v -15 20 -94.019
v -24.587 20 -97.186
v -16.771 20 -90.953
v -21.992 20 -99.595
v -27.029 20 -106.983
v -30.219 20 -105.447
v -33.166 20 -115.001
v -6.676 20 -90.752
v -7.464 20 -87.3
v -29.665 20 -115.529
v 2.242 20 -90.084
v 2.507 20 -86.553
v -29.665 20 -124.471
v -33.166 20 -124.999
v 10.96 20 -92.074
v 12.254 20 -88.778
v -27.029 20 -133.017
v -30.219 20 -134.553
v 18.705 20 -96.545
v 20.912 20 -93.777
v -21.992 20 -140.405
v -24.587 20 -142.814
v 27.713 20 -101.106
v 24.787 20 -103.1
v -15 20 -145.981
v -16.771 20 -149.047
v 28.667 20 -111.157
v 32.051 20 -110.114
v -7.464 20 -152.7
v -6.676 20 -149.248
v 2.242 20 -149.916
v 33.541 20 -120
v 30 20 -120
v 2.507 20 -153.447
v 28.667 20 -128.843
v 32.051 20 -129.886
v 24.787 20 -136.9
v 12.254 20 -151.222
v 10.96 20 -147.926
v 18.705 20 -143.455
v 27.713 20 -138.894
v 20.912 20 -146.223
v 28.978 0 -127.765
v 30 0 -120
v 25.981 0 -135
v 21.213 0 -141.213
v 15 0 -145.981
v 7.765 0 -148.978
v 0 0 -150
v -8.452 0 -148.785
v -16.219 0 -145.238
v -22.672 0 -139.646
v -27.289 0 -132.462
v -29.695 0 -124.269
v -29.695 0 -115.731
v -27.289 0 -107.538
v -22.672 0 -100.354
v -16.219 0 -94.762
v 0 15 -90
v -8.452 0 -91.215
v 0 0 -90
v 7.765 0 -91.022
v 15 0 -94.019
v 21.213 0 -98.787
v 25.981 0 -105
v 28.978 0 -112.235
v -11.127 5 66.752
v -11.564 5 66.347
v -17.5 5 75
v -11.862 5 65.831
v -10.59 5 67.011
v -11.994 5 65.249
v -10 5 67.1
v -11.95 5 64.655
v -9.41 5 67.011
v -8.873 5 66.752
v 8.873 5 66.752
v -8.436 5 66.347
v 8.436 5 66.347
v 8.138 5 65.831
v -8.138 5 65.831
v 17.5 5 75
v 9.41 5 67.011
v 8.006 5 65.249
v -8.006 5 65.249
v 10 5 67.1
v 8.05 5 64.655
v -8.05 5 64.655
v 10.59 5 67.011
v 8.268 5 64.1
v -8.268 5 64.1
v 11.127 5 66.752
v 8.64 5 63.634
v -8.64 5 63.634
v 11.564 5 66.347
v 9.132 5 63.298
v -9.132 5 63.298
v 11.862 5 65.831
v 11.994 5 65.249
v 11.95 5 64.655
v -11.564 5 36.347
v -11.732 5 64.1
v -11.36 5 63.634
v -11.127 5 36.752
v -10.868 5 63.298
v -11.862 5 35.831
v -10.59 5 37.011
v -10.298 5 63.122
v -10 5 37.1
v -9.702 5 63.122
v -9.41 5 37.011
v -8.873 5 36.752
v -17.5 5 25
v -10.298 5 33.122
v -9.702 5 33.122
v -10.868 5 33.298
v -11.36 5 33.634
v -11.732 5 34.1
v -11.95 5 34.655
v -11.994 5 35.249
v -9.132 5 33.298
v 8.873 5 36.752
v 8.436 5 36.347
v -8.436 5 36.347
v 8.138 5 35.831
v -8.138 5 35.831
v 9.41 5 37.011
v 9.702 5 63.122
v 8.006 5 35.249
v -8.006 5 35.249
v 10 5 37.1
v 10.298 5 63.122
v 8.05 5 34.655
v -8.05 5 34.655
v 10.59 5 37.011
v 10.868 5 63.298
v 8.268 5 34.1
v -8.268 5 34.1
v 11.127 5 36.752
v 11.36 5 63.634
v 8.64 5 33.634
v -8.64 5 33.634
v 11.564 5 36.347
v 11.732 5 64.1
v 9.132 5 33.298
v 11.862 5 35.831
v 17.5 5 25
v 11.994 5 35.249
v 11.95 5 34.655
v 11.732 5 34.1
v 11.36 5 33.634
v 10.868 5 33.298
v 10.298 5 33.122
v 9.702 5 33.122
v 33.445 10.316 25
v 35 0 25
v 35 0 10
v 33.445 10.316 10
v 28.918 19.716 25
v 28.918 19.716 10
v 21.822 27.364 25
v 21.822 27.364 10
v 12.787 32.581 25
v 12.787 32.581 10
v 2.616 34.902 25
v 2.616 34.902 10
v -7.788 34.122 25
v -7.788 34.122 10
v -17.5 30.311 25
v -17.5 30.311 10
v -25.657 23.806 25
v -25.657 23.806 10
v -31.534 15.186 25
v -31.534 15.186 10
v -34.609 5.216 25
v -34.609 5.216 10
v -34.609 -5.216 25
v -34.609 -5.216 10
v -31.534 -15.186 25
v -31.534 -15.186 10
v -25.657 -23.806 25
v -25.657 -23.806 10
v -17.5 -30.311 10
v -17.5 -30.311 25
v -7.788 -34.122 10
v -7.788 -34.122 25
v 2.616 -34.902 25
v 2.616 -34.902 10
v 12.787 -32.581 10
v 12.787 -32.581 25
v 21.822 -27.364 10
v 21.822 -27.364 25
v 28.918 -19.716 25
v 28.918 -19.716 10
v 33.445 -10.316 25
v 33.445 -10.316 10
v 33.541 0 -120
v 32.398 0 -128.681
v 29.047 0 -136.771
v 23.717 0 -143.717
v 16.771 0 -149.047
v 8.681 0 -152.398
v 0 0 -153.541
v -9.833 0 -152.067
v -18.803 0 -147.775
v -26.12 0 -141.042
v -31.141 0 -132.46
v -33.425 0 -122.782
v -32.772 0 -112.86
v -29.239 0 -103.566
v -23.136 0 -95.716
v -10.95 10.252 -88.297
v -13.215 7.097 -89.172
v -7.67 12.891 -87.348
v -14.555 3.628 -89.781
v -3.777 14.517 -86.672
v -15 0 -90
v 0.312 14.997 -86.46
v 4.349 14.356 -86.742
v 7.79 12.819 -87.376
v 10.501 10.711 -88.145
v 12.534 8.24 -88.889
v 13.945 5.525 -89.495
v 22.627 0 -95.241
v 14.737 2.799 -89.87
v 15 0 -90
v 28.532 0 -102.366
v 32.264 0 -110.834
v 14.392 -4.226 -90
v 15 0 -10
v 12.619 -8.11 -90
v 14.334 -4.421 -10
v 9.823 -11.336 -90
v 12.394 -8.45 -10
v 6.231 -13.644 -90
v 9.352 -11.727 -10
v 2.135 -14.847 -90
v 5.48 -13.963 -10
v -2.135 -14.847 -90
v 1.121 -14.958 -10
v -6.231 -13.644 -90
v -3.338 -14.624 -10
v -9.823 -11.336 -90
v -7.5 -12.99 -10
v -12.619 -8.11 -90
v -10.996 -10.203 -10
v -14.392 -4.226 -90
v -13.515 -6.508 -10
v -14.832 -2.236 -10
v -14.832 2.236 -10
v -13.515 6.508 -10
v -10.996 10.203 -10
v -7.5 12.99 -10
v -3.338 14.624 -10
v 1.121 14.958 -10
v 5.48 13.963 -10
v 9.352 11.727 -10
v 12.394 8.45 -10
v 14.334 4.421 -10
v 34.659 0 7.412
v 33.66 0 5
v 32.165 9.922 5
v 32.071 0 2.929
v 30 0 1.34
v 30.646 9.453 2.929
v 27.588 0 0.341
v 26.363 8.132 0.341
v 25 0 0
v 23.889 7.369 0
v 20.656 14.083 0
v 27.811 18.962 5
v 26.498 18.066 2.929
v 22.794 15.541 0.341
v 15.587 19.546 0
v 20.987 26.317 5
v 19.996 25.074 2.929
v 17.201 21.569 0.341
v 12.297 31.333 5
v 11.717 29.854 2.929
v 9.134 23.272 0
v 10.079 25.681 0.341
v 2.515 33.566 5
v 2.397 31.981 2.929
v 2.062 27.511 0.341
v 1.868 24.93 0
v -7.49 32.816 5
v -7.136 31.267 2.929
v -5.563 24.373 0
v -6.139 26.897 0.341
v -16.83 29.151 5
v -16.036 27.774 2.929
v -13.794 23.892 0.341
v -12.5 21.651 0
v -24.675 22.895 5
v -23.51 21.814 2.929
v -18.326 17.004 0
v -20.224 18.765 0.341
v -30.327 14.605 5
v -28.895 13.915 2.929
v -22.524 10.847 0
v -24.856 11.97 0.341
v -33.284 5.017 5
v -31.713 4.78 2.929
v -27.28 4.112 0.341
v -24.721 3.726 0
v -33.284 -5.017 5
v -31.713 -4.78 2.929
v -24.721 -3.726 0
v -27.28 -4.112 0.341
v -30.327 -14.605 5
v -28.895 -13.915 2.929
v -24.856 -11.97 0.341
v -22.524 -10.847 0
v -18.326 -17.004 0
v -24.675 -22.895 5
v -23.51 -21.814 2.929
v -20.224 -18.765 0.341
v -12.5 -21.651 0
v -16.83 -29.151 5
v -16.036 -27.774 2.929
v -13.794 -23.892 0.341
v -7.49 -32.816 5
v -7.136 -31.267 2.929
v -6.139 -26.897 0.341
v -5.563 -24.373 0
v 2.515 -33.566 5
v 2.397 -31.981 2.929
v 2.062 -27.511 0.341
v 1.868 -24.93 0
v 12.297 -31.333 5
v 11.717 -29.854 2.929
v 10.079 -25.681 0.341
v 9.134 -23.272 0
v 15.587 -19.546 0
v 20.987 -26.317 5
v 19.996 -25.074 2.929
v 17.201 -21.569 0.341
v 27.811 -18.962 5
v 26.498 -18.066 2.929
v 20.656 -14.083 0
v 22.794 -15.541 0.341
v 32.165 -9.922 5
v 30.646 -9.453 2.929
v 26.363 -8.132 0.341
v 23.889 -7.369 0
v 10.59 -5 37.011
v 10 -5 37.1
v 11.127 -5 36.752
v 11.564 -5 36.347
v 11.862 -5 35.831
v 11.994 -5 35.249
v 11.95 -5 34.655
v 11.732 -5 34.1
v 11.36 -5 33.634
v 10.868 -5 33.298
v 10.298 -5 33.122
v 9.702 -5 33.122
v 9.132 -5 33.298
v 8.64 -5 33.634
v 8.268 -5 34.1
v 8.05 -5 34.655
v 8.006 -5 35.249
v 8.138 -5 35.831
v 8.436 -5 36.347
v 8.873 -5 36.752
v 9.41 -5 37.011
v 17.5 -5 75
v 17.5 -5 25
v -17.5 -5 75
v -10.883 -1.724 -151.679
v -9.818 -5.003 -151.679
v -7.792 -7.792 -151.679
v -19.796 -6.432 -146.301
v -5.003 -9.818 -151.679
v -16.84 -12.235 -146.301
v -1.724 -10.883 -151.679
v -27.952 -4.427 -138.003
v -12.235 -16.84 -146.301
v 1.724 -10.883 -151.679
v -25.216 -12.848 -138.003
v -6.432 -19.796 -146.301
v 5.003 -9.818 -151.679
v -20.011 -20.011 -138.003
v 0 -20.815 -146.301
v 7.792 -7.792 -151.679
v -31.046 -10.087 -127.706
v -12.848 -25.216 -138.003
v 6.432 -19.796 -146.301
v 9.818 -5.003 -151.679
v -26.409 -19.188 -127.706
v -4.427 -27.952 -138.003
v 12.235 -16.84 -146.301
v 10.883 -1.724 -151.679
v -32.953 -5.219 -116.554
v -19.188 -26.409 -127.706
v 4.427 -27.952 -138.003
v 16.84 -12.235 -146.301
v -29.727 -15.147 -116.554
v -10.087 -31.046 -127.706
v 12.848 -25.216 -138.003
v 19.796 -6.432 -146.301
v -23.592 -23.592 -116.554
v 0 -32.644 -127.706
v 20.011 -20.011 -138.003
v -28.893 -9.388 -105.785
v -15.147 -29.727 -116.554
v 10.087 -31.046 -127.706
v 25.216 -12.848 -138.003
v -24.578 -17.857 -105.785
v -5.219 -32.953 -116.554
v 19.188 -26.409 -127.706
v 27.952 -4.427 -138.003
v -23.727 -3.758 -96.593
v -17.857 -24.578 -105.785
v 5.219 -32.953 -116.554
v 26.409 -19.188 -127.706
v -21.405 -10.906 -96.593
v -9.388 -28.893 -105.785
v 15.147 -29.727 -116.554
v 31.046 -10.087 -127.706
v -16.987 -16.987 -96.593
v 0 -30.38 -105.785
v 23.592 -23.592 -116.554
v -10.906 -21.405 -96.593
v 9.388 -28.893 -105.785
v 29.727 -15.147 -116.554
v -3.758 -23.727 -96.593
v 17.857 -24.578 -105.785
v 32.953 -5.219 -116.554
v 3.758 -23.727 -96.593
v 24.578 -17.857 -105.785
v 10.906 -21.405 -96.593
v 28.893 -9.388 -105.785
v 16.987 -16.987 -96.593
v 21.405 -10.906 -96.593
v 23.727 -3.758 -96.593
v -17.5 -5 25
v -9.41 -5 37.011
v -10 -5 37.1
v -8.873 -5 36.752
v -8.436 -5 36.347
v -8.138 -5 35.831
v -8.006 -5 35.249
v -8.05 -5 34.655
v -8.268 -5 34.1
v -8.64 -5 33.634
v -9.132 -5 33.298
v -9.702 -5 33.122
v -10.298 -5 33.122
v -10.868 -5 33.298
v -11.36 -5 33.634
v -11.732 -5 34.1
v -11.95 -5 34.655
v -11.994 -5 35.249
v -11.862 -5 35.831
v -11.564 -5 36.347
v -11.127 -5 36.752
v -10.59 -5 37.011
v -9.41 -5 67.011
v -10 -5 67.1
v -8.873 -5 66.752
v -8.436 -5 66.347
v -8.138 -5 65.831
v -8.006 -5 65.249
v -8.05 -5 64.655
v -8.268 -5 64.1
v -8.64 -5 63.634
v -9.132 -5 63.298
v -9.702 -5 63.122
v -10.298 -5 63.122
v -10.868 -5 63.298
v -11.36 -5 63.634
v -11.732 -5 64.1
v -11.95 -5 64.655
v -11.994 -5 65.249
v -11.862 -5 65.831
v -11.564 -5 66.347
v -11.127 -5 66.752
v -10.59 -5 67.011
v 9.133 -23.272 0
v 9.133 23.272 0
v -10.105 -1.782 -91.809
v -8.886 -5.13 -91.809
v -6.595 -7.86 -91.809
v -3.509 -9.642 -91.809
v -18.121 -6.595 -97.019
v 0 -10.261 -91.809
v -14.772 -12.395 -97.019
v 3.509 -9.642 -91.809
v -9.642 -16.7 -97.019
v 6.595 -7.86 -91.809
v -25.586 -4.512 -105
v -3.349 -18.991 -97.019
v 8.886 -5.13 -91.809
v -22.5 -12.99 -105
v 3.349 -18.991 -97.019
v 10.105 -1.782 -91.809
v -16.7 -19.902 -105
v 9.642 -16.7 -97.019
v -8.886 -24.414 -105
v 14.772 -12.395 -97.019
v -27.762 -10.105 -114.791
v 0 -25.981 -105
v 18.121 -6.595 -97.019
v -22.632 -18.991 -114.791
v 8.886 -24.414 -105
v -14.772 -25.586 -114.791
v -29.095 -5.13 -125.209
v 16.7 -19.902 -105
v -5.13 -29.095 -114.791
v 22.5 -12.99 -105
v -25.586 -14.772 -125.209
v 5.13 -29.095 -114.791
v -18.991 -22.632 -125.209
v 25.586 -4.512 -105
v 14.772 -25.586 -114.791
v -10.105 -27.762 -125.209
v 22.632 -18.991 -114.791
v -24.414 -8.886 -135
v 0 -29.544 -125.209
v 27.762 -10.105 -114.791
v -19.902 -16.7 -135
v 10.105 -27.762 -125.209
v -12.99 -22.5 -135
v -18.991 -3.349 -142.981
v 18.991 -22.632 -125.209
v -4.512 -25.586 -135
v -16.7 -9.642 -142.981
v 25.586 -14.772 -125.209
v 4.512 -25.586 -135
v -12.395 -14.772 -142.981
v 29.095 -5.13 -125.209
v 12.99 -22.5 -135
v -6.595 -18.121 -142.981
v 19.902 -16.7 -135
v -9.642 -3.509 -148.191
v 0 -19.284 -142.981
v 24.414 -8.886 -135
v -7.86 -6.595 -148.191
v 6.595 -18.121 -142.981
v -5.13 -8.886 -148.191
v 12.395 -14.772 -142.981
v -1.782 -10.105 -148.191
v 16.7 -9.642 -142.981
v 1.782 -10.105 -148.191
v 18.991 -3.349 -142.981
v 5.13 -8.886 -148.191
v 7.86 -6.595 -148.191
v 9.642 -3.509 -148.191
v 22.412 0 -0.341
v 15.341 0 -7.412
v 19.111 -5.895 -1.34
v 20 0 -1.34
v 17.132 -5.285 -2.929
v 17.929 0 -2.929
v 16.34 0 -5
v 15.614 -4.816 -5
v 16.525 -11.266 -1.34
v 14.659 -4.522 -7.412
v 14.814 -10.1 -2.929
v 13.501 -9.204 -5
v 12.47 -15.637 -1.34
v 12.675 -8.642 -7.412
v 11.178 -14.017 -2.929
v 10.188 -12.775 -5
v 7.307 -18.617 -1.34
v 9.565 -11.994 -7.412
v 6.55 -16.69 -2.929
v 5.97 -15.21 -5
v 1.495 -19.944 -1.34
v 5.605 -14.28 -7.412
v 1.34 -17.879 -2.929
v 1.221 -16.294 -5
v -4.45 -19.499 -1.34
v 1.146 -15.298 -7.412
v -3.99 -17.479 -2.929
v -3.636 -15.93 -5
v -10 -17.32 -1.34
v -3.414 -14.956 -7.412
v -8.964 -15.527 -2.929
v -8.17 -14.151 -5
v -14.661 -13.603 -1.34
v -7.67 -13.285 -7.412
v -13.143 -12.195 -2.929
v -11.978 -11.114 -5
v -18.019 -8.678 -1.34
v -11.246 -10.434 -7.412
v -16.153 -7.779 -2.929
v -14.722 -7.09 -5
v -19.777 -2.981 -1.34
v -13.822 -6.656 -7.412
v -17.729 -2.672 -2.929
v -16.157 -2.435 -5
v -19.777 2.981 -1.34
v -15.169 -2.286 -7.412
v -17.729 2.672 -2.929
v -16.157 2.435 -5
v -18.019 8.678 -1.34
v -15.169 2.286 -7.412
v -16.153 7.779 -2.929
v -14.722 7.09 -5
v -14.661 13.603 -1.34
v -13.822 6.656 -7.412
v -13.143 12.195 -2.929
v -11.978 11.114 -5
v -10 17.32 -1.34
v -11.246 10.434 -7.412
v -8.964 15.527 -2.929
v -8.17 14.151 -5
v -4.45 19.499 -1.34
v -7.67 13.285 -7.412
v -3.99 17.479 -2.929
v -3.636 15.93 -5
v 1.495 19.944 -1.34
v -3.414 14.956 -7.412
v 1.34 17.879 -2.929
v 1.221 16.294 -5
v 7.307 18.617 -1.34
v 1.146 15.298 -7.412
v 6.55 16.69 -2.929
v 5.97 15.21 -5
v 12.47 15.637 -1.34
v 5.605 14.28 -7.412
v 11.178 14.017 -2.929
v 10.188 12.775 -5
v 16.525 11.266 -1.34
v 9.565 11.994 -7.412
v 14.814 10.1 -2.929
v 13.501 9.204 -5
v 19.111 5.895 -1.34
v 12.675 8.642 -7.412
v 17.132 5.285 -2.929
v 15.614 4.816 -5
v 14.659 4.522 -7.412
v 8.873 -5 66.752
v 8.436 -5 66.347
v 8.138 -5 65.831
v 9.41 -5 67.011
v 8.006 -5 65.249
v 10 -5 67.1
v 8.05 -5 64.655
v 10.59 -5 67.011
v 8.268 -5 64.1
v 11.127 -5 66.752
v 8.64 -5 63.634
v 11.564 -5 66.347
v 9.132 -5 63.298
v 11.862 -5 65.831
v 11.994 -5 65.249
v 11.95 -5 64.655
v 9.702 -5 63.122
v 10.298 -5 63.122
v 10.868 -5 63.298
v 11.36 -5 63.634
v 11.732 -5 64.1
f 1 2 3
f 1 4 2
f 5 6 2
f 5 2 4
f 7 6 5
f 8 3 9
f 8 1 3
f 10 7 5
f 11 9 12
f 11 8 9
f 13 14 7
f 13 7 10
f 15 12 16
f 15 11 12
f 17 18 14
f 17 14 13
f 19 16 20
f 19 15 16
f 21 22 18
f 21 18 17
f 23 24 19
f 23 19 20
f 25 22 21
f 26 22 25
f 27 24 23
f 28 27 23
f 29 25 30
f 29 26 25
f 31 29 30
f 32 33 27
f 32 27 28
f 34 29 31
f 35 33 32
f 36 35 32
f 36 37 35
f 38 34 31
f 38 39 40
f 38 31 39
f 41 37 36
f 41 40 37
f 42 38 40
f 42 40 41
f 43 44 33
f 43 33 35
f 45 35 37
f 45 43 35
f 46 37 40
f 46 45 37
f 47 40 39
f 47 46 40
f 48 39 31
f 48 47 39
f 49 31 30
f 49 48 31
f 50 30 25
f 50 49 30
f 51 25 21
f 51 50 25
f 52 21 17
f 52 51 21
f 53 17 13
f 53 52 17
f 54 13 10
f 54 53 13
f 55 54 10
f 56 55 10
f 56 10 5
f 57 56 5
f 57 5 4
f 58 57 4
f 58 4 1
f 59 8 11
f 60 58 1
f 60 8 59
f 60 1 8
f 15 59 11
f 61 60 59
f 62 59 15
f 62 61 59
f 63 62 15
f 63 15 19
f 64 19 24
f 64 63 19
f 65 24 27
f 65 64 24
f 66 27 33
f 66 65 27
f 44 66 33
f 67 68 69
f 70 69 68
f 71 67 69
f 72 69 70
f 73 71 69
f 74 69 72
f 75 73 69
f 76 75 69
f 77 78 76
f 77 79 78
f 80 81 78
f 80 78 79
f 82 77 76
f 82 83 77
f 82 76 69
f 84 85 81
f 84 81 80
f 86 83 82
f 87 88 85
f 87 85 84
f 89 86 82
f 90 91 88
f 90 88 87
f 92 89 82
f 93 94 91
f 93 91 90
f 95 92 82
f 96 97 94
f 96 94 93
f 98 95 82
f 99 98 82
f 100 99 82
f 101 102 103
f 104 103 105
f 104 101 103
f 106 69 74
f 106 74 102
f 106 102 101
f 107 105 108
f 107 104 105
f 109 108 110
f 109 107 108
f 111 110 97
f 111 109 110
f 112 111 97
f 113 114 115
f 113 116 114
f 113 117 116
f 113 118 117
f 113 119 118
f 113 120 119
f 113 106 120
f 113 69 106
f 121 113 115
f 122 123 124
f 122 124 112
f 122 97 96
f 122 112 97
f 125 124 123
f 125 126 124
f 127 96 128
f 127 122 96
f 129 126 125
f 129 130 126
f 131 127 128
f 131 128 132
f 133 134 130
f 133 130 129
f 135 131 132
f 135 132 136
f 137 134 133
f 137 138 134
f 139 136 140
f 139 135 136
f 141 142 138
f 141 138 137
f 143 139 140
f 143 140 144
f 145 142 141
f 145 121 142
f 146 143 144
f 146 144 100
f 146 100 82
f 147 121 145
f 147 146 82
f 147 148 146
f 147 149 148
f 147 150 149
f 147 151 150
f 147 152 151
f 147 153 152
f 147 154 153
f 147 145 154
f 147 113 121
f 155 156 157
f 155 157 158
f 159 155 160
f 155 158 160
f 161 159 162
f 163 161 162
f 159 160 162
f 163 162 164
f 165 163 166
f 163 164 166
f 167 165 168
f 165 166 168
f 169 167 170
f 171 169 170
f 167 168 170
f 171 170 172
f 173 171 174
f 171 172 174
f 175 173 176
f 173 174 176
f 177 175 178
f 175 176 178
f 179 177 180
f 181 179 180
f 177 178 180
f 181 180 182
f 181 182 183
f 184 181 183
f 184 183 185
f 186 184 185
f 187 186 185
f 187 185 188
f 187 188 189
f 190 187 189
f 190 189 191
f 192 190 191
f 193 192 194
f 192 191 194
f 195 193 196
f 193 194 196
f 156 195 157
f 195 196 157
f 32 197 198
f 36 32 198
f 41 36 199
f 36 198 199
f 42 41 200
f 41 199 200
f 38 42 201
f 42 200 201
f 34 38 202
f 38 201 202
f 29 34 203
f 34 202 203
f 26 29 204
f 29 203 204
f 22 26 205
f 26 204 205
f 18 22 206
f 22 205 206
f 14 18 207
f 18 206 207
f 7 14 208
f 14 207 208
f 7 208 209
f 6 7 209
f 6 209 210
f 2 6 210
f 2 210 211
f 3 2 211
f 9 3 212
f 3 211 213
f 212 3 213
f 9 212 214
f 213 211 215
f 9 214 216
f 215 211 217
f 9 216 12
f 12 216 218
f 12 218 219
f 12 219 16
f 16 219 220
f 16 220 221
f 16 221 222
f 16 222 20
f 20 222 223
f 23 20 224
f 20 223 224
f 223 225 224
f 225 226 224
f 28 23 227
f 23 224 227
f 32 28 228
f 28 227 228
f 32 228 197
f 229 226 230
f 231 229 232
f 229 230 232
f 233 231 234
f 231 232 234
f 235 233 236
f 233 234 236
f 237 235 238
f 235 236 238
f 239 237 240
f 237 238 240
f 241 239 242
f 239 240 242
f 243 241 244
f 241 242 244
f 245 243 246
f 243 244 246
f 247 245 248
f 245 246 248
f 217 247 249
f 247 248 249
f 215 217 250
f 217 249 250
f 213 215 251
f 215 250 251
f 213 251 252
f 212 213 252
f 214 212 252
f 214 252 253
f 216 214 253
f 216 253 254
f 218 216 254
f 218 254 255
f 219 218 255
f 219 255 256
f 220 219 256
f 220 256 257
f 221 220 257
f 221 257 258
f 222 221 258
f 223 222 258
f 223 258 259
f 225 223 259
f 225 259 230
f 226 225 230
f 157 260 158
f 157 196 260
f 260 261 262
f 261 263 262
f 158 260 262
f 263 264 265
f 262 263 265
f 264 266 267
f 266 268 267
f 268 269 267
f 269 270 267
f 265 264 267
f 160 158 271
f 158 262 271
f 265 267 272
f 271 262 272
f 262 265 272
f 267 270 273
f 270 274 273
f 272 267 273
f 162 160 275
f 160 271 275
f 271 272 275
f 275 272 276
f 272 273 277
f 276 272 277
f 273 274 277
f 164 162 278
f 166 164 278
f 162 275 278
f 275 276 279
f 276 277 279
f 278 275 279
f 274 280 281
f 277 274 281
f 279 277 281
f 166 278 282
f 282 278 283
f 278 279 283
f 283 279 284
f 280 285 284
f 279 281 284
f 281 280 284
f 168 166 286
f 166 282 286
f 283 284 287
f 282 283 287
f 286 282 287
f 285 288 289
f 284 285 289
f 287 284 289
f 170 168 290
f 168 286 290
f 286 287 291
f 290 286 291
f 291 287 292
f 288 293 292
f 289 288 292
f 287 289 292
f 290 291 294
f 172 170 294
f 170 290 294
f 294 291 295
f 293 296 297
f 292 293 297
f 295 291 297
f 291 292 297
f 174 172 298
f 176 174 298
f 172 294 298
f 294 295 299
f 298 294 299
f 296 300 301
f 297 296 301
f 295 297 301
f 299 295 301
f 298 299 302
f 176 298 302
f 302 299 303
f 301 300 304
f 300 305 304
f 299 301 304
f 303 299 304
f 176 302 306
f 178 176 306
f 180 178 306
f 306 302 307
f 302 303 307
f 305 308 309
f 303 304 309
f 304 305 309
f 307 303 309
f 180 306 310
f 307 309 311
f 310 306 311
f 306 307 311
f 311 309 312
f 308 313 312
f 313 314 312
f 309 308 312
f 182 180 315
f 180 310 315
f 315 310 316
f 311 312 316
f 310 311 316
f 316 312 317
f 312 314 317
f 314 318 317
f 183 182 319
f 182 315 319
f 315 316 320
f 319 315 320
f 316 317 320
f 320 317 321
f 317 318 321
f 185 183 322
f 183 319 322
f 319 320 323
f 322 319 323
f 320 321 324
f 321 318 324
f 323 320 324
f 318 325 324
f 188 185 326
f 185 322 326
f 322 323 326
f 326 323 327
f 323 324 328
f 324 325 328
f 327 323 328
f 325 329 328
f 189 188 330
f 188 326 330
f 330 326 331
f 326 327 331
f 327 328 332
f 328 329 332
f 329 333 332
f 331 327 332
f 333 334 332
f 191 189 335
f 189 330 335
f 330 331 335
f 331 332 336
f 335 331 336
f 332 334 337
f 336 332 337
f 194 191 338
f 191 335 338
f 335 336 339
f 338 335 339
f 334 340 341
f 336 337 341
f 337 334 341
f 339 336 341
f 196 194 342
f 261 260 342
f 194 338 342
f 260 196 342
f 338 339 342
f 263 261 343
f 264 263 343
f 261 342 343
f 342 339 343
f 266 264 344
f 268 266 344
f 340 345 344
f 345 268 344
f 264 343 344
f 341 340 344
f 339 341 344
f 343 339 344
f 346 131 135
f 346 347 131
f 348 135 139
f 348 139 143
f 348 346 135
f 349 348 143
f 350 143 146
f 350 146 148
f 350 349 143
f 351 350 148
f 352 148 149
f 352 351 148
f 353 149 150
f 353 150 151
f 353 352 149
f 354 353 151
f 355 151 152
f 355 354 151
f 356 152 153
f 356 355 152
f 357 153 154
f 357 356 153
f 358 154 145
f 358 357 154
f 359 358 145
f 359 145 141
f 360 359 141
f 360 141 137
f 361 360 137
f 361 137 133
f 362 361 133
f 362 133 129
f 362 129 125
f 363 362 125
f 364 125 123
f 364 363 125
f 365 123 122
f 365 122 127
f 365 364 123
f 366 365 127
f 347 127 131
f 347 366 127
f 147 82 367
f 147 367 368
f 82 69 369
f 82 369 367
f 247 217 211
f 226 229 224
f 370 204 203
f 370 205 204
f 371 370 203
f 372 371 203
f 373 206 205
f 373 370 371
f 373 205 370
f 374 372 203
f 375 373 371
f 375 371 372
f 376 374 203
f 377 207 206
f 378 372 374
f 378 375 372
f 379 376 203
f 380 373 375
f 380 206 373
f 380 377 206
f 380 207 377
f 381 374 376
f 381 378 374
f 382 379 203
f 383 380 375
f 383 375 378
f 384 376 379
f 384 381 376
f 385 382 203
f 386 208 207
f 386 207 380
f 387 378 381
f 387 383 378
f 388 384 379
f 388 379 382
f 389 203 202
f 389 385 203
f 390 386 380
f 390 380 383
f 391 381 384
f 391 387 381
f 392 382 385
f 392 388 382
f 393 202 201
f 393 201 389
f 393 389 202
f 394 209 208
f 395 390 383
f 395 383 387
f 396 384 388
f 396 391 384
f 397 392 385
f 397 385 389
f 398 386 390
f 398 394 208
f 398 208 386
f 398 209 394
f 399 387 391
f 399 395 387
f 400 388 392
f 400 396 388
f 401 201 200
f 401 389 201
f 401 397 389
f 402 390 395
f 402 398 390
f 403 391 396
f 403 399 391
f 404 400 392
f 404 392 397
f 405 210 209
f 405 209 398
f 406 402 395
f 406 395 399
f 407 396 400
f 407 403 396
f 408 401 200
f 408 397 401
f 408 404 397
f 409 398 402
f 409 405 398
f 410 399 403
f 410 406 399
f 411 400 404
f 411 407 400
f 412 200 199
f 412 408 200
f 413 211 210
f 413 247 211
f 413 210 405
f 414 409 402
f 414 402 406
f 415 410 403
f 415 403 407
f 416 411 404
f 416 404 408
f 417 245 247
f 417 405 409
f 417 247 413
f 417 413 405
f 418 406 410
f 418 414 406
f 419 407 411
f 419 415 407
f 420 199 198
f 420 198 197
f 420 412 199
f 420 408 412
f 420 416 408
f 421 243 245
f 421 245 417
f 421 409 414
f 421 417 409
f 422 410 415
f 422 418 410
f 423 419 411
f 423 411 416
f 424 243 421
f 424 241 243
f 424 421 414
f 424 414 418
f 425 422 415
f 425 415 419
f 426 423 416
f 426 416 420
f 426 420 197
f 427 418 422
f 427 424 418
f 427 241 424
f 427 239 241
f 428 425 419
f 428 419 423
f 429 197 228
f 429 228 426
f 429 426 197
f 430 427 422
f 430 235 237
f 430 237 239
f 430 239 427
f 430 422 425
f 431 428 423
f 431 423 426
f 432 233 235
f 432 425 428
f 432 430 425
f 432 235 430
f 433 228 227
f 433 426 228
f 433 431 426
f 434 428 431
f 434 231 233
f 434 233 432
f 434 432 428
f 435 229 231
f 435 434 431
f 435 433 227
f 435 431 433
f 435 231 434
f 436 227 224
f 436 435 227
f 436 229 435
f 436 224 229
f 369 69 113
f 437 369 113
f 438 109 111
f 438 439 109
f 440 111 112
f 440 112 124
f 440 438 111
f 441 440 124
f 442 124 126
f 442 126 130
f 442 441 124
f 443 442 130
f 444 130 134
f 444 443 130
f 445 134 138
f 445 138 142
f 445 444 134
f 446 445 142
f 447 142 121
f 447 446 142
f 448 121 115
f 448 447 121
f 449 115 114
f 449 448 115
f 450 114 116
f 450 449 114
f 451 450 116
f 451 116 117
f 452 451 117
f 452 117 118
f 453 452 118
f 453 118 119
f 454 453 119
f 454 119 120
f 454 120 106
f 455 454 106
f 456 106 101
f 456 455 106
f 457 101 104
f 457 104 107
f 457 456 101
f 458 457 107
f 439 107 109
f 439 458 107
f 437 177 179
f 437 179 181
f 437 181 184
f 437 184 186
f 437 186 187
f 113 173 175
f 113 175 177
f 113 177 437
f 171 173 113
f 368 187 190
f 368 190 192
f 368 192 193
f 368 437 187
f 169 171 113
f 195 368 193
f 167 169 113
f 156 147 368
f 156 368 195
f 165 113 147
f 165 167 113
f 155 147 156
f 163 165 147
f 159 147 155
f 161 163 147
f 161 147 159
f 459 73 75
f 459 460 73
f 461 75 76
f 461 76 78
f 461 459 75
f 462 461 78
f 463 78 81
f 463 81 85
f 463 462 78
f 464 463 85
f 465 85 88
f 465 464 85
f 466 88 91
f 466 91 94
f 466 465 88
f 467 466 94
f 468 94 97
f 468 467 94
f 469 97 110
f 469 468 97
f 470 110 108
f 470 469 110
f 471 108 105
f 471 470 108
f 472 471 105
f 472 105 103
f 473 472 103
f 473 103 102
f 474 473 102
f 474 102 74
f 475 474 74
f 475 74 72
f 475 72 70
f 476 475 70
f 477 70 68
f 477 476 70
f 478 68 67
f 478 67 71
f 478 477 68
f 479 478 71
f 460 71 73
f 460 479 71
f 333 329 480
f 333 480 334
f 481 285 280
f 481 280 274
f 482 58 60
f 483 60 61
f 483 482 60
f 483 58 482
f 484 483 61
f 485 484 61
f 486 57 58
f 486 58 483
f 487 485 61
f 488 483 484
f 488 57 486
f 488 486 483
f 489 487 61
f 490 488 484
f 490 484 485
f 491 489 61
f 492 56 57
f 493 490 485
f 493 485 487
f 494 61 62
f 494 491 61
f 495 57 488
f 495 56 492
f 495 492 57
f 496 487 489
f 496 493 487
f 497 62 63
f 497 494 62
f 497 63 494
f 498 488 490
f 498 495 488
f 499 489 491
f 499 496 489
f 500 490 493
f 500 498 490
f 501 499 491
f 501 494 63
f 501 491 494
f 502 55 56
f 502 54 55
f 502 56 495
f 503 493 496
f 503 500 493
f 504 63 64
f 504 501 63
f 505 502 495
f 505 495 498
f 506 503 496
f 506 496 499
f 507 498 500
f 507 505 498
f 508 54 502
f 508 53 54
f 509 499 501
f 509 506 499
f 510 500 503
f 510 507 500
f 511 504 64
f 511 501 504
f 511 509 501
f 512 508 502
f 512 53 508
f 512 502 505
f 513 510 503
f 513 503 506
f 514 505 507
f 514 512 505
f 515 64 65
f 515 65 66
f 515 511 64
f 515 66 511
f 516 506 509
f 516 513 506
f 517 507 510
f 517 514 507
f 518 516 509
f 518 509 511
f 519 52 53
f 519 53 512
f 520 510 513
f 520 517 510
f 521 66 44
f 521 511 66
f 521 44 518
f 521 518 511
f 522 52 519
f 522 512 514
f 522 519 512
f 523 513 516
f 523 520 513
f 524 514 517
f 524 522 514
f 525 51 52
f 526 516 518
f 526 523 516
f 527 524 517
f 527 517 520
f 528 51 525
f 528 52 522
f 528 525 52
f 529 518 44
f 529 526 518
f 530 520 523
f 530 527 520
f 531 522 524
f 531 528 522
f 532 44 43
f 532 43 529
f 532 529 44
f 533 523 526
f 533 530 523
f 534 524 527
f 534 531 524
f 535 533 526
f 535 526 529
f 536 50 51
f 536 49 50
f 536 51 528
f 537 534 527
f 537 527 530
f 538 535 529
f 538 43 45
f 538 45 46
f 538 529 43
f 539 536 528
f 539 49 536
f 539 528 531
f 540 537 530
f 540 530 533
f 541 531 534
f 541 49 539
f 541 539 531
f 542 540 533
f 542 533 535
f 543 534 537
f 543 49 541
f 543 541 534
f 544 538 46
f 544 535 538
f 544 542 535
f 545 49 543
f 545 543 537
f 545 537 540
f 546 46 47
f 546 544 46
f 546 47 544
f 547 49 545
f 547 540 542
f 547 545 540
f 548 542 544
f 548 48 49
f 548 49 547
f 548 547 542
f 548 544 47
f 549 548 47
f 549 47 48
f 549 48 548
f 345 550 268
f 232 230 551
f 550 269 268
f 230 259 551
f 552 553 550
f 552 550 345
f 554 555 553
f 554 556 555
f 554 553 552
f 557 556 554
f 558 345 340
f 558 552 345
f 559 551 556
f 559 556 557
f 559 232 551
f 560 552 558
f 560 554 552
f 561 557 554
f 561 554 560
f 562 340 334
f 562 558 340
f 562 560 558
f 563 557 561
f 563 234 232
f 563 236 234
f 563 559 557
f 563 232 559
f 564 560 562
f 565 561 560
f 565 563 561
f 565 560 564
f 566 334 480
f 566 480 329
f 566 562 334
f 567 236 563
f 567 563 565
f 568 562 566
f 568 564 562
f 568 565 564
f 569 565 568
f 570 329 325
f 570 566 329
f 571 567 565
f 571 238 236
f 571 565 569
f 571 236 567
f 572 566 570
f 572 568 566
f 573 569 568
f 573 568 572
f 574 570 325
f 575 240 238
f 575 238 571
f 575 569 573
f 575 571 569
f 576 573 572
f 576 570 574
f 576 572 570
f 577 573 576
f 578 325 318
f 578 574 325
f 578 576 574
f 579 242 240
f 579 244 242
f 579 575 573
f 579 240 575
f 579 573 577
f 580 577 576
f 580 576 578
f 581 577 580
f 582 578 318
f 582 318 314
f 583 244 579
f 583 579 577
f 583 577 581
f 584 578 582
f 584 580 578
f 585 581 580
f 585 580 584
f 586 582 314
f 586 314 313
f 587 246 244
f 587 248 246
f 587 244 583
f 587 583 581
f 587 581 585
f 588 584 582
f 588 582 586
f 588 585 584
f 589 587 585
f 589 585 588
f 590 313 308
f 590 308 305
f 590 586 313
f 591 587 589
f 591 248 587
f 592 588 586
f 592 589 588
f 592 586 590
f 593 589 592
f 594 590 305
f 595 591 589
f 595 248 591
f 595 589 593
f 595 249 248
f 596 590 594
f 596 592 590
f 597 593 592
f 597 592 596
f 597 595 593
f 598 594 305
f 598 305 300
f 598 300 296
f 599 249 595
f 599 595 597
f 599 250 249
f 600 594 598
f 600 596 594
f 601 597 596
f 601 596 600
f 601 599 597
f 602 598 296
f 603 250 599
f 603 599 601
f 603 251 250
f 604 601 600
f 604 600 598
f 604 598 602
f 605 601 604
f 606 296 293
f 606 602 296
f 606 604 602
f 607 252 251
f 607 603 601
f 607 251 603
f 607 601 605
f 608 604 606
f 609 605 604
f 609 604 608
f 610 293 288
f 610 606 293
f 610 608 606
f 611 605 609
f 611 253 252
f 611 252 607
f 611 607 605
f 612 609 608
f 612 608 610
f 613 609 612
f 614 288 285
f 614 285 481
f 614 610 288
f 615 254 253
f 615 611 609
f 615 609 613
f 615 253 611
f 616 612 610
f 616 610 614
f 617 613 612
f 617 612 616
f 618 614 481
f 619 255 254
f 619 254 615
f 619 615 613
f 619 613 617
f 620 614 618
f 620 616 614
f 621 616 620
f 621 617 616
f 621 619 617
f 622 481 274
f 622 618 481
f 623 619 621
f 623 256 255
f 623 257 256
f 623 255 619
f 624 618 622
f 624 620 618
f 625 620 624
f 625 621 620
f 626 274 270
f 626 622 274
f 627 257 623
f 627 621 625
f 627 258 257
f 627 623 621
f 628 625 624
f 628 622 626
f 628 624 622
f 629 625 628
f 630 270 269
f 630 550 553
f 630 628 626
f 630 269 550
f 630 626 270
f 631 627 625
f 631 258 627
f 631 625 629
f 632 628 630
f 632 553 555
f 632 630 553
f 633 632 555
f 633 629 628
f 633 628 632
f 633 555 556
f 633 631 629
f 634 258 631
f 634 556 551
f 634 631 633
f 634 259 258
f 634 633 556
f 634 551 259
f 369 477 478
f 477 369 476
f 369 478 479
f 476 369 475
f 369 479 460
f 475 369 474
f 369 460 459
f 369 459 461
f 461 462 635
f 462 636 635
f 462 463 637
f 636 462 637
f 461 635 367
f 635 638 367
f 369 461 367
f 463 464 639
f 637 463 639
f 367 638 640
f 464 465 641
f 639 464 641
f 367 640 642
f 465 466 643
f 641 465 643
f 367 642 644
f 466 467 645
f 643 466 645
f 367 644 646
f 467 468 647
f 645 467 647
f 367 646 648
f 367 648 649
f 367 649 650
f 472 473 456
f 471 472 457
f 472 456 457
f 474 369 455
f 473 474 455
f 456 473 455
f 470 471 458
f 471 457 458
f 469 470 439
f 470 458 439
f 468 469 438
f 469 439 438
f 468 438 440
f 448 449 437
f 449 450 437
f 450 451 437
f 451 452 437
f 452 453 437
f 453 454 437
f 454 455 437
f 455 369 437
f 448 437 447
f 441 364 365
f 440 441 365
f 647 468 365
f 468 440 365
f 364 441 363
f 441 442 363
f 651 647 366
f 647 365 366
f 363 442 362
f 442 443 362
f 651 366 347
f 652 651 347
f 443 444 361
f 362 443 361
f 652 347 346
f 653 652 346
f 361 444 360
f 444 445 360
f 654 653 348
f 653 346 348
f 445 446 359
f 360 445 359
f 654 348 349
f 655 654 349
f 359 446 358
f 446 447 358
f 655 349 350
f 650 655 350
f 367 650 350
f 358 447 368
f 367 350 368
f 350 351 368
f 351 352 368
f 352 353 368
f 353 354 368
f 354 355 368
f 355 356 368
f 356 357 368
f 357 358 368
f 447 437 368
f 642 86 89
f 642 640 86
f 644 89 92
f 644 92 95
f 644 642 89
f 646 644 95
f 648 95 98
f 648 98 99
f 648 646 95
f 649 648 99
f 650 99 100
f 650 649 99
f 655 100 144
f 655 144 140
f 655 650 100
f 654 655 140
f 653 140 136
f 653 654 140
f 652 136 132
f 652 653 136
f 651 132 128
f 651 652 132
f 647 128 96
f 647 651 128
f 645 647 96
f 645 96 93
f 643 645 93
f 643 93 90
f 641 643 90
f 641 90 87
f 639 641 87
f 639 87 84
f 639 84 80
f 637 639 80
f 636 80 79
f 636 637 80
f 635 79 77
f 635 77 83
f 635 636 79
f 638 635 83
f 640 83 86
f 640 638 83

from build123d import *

# Parameters (mm, degrees)
SKETCH1_R                 = 35
BOSS_EXTRUDE1_DEPTH       = 25
SKETCH2_R                 = 15
BOSS_EXTRUDE2_DEPTH       = 90
FILLET1_R                 = 10
SKETCH3_W                 = 35
SKETCH3_H                 = 50
SKETCH3_R                 = 2
BOSS_EXTRUDE3_DEPTH       = 5
REVOLVE1_ANGLE            = 180
BOSS_EXTRUDE4_OUTLINE_R   = 33.541019662
BOSS_EXTRUDE4_OUTLINE_R_2 = 30
BOSS_EXTRUDE4_DEPTH       = 20


# Read off the part's stored shape, not the designer's step: Boss-Extrude4
with BuildPart() as part:
    # Sketch1 → Boss-Extrude1 (new body)
    with BuildSketch(Plane.XY):
        Circle(SKETCH1_R)
    extrude(amount=BOSS_EXTRUDE1_DEPTH)

    # Sketch2 → Boss-Extrude2 (add)
    with BuildSketch(Plane(origin=(0, 0, 0), x_dir=(-1, 0, 0), z_dir=(0, 0, -1))):
        with Locations(Location((0, 0, 0), (0, 0, 180))):
            Circle(SKETCH2_R)
    extrude(amount=BOSS_EXTRUDE2_DEPTH)

    # Fillet1
    fillet1_edges = [part.edges().sort_by_distance(p)[0] for p in [
        (-35, 0, 0),
        (-15, 0, 0),
    ]]
    fillet(fillet1_edges, radius=FILLET1_R - 0.0001)  # a hair under: the kernel refuses the full size

    # Sketch3 → Boss-Extrude3 (add, symmetric)
    with BuildSketch(Plane(origin=(0, 0, 0), x_dir=(1, 0, 0), z_dir=(0, 1, 0))):
        with Locations((0, -50)):
            Rectangle(SKETCH3_W, SKETCH3_H)
        with Locations(Location((-10, -35.1, 0), (0, 0, 270))):
            Circle(SKETCH3_R, mode=Mode.SUBTRACT)
        with Locations(Location((10, -35.1, 0), (0, 0, 270))):
            Circle(SKETCH3_R, mode=Mode.SUBTRACT)
        with Locations(Location((10, -65.1, 0), (0, 0, 270))):
            Circle(SKETCH3_R, mode=Mode.SUBTRACT)
        with Locations(Location((-10, -65.1, 0), (0, 0, 270))):
            Circle(SKETCH3_R, mode=Mode.SUBTRACT)
    extrude(amount=BOSS_EXTRUDE3_DEPTH, both=True)

    # Sketch4 → Revolve1 (revolve)
    with BuildSketch(Plane(origin=(0, 0, 0), x_dir=(1, 0, 0), z_dir=(0, 1, 0))):
        with BuildLine():
            Line((0, 150), (0, 153.541019662))
            ThreePointArc((0, 153.541019662), (-33.541019662, 120), (0, 86.458980338))
            Line((0, 86.458980338), (0, 90))
            ThreePointArc((0, 90), (-30, 120), (0, 150))
        make_face()
    revolve(axis=Axis((0, 0, -90), (0, 0, 1)), revolution_arc=REVOLVE1_ANGLE)

    # Boss-Extrude4 outline → Boss-Extrude4 (add)
    with BuildSketch(Plane(origin=(0, 0, 0), x_dir=(1, 0, 0), z_dir=(0, 1, 0))):
        with Locations((0, 120)):
            Circle(BOSS_EXTRUDE4_OUTLINE_R)
        with Locations((0, 120)):
            Circle(BOSS_EXTRUDE4_OUTLINE_R_2, mode=Mode.SUBTRACT)
    extrude(amount=BOSS_EXTRUDE4_DEPTH)


solid = part.part
